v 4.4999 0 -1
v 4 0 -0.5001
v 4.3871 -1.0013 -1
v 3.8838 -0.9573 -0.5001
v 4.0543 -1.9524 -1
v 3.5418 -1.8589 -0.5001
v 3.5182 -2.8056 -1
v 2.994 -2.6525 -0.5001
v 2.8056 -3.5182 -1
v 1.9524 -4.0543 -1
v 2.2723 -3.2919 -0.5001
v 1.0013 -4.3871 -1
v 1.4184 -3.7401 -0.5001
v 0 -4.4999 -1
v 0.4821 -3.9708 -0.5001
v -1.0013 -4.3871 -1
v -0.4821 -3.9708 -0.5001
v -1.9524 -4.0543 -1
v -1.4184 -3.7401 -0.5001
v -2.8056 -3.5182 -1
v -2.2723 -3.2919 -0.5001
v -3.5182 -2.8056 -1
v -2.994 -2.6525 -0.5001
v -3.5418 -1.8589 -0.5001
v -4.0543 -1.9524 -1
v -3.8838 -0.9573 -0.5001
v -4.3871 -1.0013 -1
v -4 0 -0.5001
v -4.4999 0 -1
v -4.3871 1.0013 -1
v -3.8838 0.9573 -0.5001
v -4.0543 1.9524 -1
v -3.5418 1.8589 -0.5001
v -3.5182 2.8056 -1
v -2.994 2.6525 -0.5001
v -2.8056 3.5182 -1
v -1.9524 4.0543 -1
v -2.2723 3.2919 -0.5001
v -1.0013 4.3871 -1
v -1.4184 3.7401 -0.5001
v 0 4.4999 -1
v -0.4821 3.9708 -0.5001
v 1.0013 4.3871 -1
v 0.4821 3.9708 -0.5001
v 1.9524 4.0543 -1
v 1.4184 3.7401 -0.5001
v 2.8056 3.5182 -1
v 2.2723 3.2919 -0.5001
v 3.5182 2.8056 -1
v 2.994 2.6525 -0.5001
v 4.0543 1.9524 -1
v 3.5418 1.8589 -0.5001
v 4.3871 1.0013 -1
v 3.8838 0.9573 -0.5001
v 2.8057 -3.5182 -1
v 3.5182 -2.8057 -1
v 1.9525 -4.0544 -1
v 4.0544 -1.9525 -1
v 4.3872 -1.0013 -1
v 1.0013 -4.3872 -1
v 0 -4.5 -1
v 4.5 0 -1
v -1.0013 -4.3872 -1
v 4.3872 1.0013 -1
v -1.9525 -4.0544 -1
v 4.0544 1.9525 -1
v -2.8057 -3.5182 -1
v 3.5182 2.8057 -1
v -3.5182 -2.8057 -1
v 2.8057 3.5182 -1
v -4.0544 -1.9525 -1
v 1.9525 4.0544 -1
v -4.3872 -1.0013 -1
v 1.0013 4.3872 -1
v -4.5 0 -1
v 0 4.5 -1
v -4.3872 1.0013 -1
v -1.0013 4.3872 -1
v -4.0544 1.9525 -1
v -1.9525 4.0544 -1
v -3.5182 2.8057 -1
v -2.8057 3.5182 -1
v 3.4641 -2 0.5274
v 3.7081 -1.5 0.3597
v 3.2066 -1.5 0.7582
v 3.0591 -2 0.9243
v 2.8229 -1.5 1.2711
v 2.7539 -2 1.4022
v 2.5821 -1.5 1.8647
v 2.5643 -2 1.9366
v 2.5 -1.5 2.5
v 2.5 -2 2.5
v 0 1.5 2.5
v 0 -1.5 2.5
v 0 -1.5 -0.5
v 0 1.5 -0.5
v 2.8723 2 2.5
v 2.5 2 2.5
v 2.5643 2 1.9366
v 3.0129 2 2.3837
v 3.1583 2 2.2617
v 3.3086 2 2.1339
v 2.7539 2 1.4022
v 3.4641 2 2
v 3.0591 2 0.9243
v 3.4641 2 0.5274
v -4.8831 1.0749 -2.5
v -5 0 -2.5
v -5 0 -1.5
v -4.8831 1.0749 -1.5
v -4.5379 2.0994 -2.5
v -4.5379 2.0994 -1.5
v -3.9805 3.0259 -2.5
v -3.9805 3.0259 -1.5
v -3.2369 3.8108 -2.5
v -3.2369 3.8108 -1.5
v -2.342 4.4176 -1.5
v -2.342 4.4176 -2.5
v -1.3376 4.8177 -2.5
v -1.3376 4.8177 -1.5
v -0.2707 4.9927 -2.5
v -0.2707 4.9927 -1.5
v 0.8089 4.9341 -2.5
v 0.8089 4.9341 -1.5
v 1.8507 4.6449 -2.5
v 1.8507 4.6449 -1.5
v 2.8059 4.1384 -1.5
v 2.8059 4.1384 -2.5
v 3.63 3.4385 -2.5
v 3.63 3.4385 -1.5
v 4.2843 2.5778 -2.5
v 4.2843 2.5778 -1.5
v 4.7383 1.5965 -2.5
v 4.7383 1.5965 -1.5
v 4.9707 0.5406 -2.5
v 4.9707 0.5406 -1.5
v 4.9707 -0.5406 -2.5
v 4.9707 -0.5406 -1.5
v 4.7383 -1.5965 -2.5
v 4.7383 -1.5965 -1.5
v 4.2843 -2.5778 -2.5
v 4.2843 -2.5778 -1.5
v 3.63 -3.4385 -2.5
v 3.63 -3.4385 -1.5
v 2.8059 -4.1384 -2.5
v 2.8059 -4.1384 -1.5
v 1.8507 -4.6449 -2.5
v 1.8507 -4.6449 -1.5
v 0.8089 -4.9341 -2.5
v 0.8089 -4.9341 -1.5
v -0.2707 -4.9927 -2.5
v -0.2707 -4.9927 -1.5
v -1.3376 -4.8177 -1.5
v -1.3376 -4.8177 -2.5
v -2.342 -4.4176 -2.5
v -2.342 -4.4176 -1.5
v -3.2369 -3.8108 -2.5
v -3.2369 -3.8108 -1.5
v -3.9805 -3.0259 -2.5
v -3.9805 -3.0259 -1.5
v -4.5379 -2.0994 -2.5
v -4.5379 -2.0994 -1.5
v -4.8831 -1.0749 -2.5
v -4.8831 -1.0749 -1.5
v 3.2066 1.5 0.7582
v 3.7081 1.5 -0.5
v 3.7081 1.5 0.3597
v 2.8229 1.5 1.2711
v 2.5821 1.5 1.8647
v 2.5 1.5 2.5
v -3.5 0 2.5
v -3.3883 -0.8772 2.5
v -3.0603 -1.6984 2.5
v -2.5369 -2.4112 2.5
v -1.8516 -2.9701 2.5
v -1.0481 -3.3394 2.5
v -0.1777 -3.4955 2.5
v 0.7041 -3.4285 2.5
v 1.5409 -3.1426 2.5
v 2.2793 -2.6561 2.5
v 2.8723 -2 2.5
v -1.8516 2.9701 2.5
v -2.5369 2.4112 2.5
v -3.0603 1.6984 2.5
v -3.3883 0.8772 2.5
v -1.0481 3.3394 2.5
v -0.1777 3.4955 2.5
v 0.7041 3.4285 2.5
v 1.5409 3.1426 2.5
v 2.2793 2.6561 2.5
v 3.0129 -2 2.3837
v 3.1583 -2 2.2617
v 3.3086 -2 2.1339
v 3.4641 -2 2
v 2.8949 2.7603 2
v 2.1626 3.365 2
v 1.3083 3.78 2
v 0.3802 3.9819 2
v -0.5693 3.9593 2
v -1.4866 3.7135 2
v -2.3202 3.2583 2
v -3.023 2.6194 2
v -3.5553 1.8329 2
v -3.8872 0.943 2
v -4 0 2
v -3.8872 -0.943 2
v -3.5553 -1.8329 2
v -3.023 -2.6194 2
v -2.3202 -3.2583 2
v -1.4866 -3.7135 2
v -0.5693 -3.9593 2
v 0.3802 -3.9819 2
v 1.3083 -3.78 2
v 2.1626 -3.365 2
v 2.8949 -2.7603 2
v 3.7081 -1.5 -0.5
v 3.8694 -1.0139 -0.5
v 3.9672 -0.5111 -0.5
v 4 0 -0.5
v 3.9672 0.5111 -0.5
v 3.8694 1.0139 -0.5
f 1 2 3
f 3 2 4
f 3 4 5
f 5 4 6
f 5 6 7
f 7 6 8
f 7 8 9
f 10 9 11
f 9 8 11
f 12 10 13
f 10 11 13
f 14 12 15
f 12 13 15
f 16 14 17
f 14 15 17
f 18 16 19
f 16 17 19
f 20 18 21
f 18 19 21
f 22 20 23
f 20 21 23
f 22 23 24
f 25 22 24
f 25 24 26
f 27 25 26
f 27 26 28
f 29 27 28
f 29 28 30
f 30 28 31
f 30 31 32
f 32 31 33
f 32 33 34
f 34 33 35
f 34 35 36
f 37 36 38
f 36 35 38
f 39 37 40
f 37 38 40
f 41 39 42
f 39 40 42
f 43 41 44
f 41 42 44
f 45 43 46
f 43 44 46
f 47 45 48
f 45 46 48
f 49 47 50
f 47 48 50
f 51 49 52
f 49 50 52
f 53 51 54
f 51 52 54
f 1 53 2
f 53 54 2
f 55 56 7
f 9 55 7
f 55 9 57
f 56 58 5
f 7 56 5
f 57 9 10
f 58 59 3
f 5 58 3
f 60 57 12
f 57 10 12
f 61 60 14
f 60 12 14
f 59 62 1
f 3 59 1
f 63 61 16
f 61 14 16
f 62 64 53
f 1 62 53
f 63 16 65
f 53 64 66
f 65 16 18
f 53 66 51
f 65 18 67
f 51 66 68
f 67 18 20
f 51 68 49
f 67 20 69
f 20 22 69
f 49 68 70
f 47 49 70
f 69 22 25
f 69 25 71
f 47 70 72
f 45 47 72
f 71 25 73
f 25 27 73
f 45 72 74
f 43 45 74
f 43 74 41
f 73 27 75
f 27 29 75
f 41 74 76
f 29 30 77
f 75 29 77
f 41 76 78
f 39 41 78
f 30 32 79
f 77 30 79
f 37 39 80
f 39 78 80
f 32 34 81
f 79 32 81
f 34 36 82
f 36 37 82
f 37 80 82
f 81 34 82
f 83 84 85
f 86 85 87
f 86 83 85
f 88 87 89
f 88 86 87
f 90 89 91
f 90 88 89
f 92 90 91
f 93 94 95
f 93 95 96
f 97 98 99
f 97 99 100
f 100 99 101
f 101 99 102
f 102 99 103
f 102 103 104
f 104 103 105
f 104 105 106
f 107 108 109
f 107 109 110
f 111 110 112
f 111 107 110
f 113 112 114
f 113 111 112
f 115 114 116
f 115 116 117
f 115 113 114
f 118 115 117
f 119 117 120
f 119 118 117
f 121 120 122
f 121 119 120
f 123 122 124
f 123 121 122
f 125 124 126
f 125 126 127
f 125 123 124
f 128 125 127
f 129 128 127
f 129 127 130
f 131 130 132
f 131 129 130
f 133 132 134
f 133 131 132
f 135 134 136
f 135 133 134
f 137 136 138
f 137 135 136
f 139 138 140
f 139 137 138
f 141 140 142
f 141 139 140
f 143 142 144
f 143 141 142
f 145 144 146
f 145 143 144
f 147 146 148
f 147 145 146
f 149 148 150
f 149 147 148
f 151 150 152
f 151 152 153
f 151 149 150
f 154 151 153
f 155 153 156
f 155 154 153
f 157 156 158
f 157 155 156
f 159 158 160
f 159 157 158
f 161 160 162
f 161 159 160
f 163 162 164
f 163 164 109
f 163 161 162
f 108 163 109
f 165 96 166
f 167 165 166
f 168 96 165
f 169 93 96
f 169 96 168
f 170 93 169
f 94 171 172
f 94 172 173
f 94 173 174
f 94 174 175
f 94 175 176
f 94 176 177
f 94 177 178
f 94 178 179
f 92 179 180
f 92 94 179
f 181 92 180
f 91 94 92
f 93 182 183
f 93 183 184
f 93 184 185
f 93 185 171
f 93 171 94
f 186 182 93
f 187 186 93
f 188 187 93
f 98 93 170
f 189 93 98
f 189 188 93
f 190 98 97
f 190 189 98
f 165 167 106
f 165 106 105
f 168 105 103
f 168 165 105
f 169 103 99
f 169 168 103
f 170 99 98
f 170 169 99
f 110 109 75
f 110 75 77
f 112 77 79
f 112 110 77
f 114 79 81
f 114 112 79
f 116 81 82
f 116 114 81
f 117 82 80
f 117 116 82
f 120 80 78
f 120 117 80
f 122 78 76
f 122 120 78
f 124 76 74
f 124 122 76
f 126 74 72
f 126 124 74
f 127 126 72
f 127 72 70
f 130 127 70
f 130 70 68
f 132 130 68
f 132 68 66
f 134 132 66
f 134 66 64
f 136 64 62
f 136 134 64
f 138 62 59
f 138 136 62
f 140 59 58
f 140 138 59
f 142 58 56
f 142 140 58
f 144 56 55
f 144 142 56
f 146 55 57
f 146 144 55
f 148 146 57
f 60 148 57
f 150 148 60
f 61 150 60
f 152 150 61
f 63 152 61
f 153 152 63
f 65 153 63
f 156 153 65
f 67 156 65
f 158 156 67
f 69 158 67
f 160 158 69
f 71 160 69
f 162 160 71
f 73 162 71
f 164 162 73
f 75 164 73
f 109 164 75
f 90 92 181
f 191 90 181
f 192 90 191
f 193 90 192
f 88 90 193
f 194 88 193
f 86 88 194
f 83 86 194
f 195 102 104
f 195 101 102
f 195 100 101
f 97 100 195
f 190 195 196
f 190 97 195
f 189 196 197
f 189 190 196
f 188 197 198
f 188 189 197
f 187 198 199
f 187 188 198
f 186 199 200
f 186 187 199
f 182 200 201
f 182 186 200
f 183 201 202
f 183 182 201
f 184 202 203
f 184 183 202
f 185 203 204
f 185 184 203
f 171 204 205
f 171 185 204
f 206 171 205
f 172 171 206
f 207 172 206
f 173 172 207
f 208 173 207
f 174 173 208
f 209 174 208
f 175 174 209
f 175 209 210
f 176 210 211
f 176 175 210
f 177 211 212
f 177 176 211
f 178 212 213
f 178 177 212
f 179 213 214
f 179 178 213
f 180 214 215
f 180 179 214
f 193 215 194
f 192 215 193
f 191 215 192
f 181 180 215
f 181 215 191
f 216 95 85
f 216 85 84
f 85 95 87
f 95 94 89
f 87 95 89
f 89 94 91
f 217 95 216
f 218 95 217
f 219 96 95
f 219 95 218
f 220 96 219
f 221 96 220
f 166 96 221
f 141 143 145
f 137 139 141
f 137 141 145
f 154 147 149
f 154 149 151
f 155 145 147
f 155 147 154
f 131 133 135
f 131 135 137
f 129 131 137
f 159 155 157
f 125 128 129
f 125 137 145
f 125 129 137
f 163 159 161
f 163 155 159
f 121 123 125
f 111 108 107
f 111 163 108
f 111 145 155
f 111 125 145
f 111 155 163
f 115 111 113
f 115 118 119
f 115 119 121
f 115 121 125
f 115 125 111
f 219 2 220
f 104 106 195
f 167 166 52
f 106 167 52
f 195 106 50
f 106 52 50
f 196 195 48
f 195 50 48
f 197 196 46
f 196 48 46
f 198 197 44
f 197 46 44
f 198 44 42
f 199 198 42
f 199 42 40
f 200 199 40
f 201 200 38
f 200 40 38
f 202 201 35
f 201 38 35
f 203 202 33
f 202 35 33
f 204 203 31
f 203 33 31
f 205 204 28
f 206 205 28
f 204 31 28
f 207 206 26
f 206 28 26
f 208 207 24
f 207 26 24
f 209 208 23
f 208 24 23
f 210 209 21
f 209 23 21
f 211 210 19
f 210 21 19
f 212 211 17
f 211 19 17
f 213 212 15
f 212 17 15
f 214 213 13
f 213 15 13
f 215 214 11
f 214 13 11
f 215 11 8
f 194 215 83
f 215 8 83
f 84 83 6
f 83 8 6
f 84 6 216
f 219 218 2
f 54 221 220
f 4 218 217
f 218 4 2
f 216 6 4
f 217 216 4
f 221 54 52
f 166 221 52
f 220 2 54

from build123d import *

# Parameters (mm, degrees)
BOSS_EXTRUDE1_DEPTH      = 2.5
BOSS_EXTRUDE1_DEPTH_BACK = 2.5
SKETCH1_R                = 4
SKETCH2_W                = 8
SKETCH2_H                = 3
CUT_EXTRUDE1_DEPTH       = 3
CUT_EXTRUDE2_DEPTH       = 2
CUT_EXTRUDE2_DEPTH_BACK  = 2
SKETCH3_R                = 2.5
CHAMFER1_SIZE            = 0.5
SKETCH4_R                = 5
BOSS_EXTRUDE2_DEPTH      = 1.5
CHAMFER2_SIZE            = 0.5
CHAMFER3_SIZE            = 0.5


with BuildPart() as part:
    # Sketch1 → Boss-Extrude1 (new, two sides: drawn at the far end of the back side and taken through both)
    with BuildSketch(Plane.XY.offset(-BOSS_EXTRUDE1_DEPTH_BACK)):
        Circle(SKETCH1_R)
    extrude(amount=BOSS_EXTRUDE1_DEPTH + BOSS_EXTRUDE1_DEPTH_BACK)

    # Sketch2 → Cut-Extrude1 (cut)
    with BuildSketch(Plane.XY.offset(2.5)):
        with Locations((4, 0)):
            Rectangle(SKETCH2_W, SKETCH2_H)
    extrude(amount=-CUT_EXTRUDE1_DEPTH, mode=Mode.SUBTRACT)

    # Sketch3 → Cut-Extrude2 (cut, two sides: drawn at the far end of the back side and taken through both)
    with BuildSketch(Plane(origin=(0, 0, 0), x_dir=(1, 0, 0), z_dir=(0, 1, 0)).offset(-CUT_EXTRUDE2_DEPTH_BACK)):
        with Locations((5, -2.5)):
            Circle(SKETCH3_R)
    extrude(amount=CUT_EXTRUDE2_DEPTH + CUT_EXTRUDE2_DEPTH_BACK, mode=Mode.SUBTRACT)

    # Chamfer1
    chamfer1_edges = [part.edges().sort_by_distance(p)[0] for p in [
        (-4, 0, 2.5),
    ]]
    chamfer(chamfer1_edges, length=CHAMFER1_SIZE)

    # Sketch4 → Boss-Extrude2 (add)
    with BuildSketch(Plane(origin=(0, 0, -2.5), x_dir=(-1, 0, 0), z_dir=(0, 0, -1))):
        Circle(SKETCH4_R)
    extrude(amount=-BOSS_EXTRUDE2_DEPTH)

    # Chamfer2
    chamfer2_edges = [part.edges().sort_by_distance(p)[0] for p in [
        (-4, 0, -1),
    ]]
    chamfer(chamfer2_edges, length=CHAMFER2_SIZE - 0.0001)  # a hair under: the kernel refuses the full size

    # Chamfer3
    chamfer3_edges = [part.edges().sort_by_distance(p)[0] for p in [
        (5, 0, -1),
    ]]
    chamfer(chamfer3_edges, length=CHAMFER3_SIZE)


solid = part.part
